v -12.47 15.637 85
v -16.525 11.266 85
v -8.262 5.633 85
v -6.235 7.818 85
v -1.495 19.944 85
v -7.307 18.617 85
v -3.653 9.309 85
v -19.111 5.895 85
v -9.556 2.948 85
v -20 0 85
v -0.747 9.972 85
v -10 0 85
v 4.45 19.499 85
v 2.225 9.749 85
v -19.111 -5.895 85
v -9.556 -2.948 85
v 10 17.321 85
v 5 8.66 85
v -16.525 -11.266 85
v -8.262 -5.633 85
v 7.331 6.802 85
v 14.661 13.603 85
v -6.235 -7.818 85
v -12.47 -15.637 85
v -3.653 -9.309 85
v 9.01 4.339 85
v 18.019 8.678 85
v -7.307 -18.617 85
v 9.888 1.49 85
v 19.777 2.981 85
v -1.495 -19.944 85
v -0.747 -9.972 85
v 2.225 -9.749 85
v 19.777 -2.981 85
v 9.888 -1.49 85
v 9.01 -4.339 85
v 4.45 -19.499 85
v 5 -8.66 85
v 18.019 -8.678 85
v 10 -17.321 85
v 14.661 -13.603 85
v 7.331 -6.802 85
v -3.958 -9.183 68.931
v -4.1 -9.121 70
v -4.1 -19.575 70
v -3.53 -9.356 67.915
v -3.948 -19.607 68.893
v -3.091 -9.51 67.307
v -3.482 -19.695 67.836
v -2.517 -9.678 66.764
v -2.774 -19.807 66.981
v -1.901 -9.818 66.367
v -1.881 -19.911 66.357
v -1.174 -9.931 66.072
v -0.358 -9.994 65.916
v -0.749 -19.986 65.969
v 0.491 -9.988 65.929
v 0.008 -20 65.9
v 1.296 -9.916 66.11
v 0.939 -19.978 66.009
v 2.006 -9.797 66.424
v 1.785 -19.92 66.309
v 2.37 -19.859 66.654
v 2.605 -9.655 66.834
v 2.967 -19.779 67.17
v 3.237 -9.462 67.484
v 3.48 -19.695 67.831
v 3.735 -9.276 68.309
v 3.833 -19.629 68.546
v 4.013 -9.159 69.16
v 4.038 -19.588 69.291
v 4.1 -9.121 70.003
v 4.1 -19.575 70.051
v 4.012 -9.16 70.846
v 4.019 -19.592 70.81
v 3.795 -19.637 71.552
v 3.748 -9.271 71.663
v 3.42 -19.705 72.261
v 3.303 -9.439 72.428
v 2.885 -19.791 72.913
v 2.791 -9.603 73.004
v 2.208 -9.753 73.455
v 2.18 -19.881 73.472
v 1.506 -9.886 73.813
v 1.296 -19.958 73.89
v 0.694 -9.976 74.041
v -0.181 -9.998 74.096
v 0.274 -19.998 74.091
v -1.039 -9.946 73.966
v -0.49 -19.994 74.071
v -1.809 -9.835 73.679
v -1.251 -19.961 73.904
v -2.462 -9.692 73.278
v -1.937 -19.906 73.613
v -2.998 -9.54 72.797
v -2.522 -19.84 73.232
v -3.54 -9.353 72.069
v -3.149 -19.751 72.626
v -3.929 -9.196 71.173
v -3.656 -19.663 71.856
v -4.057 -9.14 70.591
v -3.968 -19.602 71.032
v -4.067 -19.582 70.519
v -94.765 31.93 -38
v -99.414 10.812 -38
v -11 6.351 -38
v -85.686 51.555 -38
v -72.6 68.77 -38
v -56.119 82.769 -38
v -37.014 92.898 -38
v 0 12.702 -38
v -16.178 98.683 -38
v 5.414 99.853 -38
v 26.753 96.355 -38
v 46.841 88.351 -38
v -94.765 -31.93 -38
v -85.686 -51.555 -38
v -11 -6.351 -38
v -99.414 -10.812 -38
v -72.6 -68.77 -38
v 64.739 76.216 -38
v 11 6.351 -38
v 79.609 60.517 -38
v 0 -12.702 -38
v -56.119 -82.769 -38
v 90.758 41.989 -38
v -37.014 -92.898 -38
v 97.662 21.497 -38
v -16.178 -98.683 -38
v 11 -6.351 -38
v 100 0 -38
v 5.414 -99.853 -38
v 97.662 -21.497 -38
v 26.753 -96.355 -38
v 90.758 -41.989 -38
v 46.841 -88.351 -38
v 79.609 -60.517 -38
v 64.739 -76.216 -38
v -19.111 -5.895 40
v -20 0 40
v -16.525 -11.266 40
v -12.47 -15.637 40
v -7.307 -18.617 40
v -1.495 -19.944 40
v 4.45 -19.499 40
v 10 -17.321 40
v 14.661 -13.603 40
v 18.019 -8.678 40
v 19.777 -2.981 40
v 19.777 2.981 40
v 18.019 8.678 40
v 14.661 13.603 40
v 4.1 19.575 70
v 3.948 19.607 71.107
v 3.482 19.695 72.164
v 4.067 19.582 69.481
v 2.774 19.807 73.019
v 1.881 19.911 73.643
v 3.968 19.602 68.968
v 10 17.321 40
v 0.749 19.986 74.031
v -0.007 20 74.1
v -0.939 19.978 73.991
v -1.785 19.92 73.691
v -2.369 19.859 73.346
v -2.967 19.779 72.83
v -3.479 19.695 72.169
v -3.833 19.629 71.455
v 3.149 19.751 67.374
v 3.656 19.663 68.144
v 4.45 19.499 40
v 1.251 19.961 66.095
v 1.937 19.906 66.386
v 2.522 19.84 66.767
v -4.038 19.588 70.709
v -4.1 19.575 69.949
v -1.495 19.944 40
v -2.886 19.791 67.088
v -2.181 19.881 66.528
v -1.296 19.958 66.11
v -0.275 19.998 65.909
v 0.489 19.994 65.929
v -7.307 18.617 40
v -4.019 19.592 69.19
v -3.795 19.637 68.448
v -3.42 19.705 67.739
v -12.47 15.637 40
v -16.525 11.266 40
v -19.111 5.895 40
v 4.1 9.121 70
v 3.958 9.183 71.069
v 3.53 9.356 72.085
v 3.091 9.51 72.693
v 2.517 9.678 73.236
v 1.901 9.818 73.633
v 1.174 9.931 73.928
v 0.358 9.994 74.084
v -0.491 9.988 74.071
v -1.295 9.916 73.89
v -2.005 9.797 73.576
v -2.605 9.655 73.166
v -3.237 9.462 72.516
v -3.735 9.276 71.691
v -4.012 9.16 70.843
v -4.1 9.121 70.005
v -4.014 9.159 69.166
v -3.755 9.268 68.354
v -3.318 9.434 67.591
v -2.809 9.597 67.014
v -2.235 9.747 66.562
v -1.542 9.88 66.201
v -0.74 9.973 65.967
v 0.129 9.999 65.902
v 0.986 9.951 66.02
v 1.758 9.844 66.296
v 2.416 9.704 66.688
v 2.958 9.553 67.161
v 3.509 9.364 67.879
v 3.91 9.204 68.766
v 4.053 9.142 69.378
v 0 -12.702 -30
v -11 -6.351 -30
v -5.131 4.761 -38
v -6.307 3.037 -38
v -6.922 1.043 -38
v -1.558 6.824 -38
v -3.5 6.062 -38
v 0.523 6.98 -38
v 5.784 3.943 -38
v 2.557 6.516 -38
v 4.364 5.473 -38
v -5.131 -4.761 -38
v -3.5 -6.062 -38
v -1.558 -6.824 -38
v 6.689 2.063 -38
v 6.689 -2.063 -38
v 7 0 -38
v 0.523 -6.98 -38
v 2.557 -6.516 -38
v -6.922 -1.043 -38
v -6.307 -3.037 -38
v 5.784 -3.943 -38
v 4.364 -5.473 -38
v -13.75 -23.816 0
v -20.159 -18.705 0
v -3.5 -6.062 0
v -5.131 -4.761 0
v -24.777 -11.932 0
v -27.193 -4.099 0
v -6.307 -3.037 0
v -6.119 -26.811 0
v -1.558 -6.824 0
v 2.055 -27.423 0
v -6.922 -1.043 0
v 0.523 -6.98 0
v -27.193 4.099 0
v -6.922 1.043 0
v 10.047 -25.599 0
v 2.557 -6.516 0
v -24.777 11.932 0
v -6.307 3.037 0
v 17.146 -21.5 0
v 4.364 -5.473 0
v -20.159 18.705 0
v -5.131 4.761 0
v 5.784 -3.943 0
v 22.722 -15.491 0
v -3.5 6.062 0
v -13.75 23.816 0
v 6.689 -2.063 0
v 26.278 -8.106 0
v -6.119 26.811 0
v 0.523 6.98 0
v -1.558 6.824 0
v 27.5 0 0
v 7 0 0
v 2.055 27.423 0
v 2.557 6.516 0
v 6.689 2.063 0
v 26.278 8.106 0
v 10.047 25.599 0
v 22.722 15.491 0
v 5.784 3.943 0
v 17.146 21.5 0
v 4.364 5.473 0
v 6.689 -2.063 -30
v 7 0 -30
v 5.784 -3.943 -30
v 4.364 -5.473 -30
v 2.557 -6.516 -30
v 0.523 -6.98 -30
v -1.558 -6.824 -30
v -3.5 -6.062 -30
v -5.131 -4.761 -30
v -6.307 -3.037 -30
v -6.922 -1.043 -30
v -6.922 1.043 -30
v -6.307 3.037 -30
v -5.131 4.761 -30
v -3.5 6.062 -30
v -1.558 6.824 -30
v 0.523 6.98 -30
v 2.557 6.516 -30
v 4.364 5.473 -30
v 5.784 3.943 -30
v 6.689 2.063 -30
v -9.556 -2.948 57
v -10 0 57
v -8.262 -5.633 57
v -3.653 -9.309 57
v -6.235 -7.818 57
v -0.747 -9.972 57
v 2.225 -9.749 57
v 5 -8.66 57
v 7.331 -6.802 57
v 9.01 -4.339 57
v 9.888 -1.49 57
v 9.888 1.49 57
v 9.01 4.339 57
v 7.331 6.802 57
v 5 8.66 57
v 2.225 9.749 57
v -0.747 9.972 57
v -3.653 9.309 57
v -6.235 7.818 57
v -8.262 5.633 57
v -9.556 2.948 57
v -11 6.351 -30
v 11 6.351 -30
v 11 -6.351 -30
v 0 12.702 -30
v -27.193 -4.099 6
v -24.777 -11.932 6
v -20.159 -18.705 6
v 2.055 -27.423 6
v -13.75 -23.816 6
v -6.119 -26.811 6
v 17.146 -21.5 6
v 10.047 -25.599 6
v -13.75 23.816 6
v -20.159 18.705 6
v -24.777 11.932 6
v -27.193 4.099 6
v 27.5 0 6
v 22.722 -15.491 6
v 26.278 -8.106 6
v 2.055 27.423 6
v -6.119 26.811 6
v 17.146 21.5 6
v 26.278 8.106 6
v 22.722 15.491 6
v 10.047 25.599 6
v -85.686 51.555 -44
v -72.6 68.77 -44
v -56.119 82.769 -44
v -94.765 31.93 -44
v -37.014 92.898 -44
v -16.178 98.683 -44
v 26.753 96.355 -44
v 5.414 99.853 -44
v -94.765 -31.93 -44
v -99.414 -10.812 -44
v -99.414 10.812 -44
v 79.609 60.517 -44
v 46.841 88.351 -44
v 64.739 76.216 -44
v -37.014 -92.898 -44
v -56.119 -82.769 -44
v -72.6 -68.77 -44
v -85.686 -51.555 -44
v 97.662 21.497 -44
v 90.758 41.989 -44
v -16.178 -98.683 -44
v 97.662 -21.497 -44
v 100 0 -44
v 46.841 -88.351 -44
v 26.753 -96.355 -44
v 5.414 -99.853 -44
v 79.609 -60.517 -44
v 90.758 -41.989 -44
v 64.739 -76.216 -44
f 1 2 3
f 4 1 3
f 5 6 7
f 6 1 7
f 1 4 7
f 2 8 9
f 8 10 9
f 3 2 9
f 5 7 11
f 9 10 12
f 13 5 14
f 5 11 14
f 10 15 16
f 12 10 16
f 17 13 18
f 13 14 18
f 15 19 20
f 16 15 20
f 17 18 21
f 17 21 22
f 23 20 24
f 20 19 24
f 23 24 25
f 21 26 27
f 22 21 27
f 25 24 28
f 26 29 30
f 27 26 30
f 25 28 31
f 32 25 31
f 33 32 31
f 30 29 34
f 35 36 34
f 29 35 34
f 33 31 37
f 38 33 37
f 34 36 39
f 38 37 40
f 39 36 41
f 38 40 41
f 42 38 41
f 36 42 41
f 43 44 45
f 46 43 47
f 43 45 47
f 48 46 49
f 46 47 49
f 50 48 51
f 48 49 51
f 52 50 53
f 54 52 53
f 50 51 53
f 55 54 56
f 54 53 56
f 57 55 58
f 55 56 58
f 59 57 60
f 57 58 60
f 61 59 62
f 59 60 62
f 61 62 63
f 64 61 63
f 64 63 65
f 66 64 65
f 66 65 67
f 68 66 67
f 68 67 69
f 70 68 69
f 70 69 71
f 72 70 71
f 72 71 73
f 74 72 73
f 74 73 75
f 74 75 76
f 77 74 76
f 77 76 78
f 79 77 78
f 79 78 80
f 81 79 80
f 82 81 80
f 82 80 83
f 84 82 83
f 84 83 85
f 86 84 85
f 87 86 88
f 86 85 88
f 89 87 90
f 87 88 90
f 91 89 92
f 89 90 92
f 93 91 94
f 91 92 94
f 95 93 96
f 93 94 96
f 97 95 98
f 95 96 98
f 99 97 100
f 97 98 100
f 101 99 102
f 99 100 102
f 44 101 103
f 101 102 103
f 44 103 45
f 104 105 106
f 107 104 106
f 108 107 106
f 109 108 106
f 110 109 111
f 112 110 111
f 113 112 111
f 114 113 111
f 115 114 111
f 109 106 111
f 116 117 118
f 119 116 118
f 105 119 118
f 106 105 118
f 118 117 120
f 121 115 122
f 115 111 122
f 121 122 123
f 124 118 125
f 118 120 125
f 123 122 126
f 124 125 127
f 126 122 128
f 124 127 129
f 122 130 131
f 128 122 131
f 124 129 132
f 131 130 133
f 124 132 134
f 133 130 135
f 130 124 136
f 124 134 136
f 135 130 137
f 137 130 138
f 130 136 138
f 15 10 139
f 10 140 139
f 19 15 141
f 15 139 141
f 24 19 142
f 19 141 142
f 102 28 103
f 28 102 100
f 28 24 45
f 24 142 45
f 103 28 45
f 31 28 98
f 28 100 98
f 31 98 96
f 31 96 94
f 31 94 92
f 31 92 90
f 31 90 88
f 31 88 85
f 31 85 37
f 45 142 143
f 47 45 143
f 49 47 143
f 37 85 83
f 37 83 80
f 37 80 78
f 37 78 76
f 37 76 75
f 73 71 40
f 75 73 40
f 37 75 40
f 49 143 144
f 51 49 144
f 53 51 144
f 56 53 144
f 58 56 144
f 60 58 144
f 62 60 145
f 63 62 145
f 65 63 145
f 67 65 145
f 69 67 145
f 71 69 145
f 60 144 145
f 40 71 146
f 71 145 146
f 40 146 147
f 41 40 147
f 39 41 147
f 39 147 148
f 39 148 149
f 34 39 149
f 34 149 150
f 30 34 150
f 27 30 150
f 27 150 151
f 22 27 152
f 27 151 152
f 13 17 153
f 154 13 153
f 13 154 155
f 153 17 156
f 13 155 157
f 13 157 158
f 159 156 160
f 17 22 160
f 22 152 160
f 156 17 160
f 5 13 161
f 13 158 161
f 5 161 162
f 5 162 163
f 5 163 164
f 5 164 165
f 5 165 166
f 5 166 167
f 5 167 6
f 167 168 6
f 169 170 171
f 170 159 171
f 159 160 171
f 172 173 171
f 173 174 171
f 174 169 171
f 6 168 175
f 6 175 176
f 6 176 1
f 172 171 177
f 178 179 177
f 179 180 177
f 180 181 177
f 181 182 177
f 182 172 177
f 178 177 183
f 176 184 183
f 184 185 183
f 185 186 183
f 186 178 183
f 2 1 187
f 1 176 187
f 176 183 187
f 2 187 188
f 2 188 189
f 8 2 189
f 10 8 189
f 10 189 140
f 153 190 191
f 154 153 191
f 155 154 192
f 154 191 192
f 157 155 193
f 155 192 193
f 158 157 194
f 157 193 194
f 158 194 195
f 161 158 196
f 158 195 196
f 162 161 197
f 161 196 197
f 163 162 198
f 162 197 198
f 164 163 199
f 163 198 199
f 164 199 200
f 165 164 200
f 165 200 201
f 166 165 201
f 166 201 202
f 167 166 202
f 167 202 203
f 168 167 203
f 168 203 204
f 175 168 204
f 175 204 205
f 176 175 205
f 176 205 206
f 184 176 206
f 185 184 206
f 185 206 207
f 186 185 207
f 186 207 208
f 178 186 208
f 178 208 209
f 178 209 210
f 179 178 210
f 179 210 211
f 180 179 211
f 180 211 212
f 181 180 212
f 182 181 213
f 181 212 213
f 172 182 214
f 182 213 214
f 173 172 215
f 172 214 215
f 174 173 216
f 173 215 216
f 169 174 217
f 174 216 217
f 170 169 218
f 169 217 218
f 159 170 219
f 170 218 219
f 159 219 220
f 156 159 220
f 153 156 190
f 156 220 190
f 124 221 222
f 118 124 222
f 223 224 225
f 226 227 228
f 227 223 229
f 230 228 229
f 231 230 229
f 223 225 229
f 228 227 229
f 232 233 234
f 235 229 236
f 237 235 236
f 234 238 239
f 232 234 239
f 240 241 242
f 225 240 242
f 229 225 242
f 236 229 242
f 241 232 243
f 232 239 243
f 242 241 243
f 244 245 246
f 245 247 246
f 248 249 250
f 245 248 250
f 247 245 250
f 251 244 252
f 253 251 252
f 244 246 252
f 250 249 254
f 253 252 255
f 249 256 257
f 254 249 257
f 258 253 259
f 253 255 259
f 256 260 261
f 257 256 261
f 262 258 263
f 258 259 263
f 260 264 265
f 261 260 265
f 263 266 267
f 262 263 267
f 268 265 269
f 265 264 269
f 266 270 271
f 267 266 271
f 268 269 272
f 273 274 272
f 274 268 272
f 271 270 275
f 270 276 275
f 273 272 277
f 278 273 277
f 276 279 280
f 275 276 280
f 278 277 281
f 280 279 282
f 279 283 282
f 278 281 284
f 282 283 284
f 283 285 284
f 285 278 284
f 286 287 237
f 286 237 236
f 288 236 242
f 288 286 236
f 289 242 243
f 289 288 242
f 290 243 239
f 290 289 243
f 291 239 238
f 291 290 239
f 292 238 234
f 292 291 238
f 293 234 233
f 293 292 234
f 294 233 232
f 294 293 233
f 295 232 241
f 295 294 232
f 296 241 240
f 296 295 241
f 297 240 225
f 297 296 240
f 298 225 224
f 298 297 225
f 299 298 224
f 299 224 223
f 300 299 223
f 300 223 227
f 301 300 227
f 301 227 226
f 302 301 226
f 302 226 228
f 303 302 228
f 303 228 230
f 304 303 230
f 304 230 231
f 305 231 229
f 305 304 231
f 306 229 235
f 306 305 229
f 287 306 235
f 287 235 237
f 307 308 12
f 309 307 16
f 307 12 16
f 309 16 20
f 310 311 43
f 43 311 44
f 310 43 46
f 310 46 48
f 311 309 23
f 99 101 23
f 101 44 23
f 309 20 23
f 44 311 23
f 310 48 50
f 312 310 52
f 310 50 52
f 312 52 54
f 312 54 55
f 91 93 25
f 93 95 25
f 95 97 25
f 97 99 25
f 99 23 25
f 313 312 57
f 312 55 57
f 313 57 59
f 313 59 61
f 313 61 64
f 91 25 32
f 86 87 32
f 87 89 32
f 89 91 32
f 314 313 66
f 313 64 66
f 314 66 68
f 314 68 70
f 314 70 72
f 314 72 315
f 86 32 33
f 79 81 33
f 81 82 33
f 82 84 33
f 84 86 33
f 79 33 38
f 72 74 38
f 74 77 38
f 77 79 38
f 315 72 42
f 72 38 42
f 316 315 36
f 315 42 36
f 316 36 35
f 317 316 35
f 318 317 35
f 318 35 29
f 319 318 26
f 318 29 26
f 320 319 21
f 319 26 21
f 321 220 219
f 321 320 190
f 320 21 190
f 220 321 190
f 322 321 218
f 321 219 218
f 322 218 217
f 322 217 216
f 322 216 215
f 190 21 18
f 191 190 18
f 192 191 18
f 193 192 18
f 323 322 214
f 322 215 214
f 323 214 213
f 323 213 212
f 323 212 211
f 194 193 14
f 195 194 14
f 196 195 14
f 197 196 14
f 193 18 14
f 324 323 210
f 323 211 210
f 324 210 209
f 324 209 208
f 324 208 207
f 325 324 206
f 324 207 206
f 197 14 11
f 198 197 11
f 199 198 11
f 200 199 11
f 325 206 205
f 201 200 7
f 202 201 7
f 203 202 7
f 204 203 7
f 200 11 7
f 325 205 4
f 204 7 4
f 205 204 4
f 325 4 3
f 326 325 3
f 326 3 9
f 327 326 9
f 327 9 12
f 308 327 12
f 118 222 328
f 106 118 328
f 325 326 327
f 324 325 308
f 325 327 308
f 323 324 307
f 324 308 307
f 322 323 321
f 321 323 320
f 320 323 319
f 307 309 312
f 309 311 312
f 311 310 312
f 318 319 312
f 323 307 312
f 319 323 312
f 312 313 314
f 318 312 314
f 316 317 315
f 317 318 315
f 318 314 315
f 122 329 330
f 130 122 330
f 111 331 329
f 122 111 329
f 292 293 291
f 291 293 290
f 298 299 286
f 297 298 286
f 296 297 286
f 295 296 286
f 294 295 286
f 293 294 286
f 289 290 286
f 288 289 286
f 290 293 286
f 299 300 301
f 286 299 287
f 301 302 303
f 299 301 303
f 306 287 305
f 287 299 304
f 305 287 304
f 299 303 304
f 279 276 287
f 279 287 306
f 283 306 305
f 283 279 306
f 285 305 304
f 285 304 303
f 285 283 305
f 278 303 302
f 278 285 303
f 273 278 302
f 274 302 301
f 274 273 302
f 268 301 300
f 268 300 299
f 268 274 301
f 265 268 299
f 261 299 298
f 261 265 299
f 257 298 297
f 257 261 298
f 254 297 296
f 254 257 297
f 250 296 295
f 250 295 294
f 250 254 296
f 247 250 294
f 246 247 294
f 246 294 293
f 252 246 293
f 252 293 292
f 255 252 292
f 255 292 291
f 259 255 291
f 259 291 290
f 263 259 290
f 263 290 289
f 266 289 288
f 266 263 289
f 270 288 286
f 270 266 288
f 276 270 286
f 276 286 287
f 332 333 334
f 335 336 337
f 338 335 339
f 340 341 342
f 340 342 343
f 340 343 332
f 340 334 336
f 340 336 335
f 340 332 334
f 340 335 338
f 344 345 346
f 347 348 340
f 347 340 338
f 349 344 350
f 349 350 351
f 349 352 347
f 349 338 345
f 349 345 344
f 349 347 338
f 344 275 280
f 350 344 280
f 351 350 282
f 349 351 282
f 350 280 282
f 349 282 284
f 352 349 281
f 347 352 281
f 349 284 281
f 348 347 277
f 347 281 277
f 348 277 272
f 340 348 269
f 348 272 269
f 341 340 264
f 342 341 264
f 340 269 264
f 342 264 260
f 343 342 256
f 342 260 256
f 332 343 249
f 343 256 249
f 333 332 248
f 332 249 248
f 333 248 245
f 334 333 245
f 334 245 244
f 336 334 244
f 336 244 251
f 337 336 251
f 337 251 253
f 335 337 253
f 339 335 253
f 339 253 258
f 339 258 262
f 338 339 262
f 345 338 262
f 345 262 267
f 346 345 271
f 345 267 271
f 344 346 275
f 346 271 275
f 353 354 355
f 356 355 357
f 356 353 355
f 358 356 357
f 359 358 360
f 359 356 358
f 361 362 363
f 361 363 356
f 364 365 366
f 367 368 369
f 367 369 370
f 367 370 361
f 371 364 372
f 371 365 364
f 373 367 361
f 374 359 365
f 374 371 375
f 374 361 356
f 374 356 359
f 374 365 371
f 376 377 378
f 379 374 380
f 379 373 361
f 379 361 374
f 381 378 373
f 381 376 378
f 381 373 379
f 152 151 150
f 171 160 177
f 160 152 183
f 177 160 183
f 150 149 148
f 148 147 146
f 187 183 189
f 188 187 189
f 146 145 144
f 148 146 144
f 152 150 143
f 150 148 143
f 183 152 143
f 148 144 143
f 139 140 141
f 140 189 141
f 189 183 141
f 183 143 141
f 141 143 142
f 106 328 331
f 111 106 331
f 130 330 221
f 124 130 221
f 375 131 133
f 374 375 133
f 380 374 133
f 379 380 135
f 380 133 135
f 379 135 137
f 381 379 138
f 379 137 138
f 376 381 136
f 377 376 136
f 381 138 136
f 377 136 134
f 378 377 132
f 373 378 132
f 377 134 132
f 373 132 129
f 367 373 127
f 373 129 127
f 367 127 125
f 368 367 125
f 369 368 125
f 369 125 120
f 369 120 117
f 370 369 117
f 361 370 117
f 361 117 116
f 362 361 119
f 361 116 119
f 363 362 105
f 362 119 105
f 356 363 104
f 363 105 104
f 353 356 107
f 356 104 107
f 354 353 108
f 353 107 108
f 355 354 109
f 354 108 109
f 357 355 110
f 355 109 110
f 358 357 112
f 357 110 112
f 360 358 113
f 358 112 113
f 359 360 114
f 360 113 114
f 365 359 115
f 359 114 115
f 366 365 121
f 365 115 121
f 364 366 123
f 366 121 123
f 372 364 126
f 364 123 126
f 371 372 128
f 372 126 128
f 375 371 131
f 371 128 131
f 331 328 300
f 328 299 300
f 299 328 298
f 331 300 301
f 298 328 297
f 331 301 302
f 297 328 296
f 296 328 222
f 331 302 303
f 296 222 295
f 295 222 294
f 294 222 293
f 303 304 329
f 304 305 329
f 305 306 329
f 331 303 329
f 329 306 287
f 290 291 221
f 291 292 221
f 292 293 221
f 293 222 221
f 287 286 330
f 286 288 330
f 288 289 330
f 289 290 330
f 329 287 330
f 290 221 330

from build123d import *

# Parameters (mm, degrees)
F0_R      = 27.5
F1_DEPTH  = 6
F2_R      = 7
F3_DEPTH  = 30
F4_R      = 7
F5_DEPTH  = 8
F6_R      = 100
F6_R_2    = 7
F7_DEPTH  = 6
F10_D     = 8.2
F10_DEPTH = 30
F10_TIP   = 2.463528538
F11_D     = 8.2
F11_DEPTH = 30
F11_START = 10.0000001
F11_TIP   = 2.463528538


with BuildPart() as f1:
    # F0 (on Top) → F1 (new body)
    with BuildSketch(Plane.XY):
        Circle(F0_R)
    extrude(amount=F1_DEPTH)

    # F2 (on face) → F3 (join)
    with BuildSketch(Plane.XY):
        Circle(F2_R)
    extrude(amount=-F3_DEPTH)


with BuildPart() as f5:
    # F4 (on face) → F5 (new body)
    with BuildSketch(Plane(origin=(0, 0, -30), x_dir=(1, 0, 0), z_dir=(0, 0, -1))):
        Polygon((11, -6.3508529611), (11, 6.3508529611), (0, 12.7017059222), (-11, 6.3508529611), (-11, -6.3508529611), (0, -12.7017059222), align=None)
        Circle(F4_R, mode=Mode.SUBTRACT)
    extrude(amount=F5_DEPTH)

    # F6 (on face) → F7 (join)
    with BuildSketch(Plane(origin=(0, 0, -38), x_dir=(1, 0, 0), z_dir=(0, 0, -1))):
        Circle(F6_R)
        Polygon((11, -6.3508529611), (0, -12.7017059222), (-11, -6.3508529611), (-11, 6.3508529611), (0, 12.7017059222), (11, 6.3508529611), align=None, mode=Mode.SUBTRACT)
        Polygon((-11, -6.3508529611), (0, -12.7017059222), (11, -6.3508529611), (11, 6.3508529611), (0, 12.7017059222), (-11, 6.3508529611), align=None)
        Circle(F6_R_2, mode=Mode.SUBTRACT)
        Circle(F6_R_2)
    extrude(amount=F7_DEPTH)


with BuildPart() as f9:
    # F8 (on Front) → F9 (revolve)
    with BuildSketch(Plane.XZ):
        Polygon((-20, 40), (0, 40), (0, 57), (-10, 57), (-10, 85), (-20, 85), align=None)
    revolve(axis=Axis((0, 0, 48.5), (0, 0, 1)))

    # F10 (one way)
    with BuildSketch(Plane.XZ):
        with Locations((0, 70)):
            Circle(F10_D / 2)
    extrude(amount=-F10_DEPTH, mode=Mode.SUBTRACT)
    with Locations(Plane.XZ):
        with Locations((0, 70)):
            with Locations((0, 0, -(F10_DEPTH + F10_TIP / 2))):  # 118° drill point
                Cone(0, F10_D / 2, F10_TIP, mode=Mode.SUBTRACT)

    # F11
    # its depths count from where the whole tool has entered the part; down to there all is cleared
    with Locations(Plane(origin=(0, 0, 0), x_dir=(1, 0, 0), z_dir=(0, 1, 0)).offset(-F11_START)):
        with Locations((0, -70)):
            Hole(F11_D / 2, depth=F11_DEPTH)
            with Locations((0, 0, -(F11_DEPTH + F11_TIP / 2))):  # 118° drill point
                Cone(0, F11_D / 2, F11_TIP, mode=Mode.SUBTRACT)


solid = Compound([f1.part, f5.part, f9.part])
